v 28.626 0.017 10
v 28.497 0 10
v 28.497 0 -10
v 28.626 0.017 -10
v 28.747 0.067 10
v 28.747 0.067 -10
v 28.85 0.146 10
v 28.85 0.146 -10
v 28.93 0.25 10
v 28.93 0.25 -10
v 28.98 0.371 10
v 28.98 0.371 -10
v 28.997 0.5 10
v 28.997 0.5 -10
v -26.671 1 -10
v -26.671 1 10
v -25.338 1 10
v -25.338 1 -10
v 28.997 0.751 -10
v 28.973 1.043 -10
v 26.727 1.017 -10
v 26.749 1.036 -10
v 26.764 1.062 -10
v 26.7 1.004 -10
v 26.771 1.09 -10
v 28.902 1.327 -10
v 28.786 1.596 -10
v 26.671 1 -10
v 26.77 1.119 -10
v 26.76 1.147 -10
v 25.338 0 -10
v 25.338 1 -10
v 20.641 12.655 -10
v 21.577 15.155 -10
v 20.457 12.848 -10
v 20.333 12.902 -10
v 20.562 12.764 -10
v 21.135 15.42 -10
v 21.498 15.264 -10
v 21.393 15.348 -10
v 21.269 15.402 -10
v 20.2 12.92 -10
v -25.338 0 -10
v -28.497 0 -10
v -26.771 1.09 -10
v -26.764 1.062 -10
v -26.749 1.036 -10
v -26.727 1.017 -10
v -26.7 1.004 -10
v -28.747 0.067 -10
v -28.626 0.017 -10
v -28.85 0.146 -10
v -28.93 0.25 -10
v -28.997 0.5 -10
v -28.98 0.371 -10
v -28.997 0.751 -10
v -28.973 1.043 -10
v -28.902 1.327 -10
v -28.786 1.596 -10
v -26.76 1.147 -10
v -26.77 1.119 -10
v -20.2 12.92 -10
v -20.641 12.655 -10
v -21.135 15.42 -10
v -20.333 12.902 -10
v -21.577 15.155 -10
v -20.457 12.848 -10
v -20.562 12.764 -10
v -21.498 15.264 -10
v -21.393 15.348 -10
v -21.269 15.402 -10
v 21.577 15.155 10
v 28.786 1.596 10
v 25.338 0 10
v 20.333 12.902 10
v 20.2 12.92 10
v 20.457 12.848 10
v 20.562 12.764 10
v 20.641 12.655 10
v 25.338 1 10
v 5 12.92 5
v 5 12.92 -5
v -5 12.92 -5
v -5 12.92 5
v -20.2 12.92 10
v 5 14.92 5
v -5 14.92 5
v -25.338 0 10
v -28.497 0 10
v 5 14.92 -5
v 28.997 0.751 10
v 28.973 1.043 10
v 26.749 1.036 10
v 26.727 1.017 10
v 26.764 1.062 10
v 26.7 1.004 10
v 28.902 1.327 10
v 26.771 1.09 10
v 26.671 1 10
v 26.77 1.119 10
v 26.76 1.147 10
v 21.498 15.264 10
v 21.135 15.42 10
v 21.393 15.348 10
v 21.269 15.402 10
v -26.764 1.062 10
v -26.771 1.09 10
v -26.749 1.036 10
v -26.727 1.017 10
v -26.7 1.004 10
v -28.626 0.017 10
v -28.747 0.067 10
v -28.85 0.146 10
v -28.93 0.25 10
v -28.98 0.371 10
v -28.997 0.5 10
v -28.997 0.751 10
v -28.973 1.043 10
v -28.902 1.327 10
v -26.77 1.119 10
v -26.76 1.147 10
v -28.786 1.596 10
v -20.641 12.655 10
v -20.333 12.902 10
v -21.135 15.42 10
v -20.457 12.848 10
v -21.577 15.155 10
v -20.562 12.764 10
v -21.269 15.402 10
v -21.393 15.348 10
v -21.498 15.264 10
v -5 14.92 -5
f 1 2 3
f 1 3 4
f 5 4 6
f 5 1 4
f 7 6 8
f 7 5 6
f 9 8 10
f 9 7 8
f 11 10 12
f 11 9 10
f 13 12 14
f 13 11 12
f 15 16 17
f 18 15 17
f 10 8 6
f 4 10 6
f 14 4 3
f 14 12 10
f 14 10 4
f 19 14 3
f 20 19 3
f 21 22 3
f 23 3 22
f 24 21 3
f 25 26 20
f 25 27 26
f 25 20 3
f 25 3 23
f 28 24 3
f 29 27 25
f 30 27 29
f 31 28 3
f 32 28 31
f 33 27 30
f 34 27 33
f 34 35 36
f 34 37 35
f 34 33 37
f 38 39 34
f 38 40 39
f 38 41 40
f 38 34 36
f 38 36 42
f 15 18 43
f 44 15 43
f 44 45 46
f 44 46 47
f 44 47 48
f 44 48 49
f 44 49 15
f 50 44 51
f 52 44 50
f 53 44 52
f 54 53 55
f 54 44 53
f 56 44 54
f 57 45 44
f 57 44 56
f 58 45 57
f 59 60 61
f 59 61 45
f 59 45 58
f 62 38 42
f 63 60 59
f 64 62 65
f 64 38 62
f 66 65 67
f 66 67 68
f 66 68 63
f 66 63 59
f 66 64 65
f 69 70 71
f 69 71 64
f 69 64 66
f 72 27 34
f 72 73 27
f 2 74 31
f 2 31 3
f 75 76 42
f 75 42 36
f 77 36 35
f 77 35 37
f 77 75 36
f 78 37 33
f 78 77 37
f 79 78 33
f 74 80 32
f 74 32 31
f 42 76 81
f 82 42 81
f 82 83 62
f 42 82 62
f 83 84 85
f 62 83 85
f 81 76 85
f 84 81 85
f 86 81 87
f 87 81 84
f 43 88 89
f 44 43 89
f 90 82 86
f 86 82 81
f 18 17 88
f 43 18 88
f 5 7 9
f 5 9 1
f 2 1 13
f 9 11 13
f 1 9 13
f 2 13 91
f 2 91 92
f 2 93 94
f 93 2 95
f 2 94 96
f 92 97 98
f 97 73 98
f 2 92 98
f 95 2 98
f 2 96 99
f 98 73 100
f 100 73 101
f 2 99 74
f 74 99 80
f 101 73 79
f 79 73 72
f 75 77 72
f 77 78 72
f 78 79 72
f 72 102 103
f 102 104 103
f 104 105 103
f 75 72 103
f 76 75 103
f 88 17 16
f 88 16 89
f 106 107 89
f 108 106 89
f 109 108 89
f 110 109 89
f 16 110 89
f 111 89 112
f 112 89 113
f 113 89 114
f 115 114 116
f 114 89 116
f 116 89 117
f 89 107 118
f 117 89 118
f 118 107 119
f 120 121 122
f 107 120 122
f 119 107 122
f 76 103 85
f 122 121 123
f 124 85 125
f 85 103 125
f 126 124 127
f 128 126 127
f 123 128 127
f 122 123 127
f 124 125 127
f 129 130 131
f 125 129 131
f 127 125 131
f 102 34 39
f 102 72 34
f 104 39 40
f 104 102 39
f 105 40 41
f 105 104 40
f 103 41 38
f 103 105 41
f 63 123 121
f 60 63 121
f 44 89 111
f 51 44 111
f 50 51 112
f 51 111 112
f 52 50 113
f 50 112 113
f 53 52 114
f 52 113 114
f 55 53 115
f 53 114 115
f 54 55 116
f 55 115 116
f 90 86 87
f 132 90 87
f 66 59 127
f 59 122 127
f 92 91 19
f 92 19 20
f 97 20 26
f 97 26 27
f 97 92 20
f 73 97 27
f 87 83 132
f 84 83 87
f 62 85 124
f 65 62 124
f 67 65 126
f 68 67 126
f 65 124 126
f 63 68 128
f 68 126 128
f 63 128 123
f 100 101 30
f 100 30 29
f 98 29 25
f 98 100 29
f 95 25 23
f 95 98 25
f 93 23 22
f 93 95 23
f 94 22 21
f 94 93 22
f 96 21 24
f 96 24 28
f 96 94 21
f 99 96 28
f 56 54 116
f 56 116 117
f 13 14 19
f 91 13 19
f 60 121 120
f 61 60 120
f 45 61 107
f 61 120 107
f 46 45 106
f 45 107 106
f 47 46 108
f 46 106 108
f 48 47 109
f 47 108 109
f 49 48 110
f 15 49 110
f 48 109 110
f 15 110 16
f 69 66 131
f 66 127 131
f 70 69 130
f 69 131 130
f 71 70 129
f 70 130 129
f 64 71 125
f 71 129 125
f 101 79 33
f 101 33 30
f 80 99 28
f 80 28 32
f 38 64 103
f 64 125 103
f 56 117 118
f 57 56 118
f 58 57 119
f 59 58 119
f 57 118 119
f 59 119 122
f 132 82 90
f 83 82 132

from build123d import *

# Parameters (mm, degrees)
F1_DEPTH = 10
F2_W     = 5
F2_H     = 10
F3_DEPTH = 2


with BuildPart() as f1:
    # F0 (on Top) → F1 (new body, symmetric)
    with BuildSketch(Plane.XY):
        with BuildLine():
            Line((21.1354362127, 15.4197925036), (0, 15.4197925036))
            Line((0, 15.4197925036), (0, 12.9197925036))
            Line((0, 12.9197925036), (20.1995696905, 12.9197925036))
            ThreePointArc((20.1995696905, 12.9197925036), (20.4570887279, 12.8483761539), (20.6410434869, 12.654528285))
            Line((20.6410434869, 12.654528285), (26.7597329087, 1.1469471563))
            ThreePointArc((26.7597329087, 1.1469471563), (26.7571548794, 1.0484961925), (26.6714381494, 1))
            Line((26.6714381494, 1), (25.3378660976, 1))
            Line((25.3378660976, 1), (25.3378660976, 0))
            Line((25.3378660976, 0), (28.4966643127, 0))
            ThreePointArc((28.4966643127, 0), (28.8502177032, 0.1464466094), (28.9966643127, 0.5))
            Line((28.9966643127, 0.5), (28.9966643127, 0.7512095949))
            ThreePointArc((28.9966643127, 0.7512095949), (28.94319662, 1.186669007), (28.7859699798, 1.5962584079))
            Line((28.7859699798, 1.5962584079), (21.5769100091, 15.154528285))
            ThreePointArc((21.5769100091, 15.154528285), (21.3929552502, 15.3483761539), (21.1354362127, 15.4197925036))
        make_face()
    extrude(amount=F1_DEPTH, both=True)

    # F2 (on face) → F3 (cut)
    with BuildSketch(Plane.XZ.offset(-12.9197925036)):
        with Locations((2.5, 0)):
            Rectangle(F2_W, F2_H)
    extrude(amount=-F3_DEPTH, mode=Mode.SUBTRACT)

    # F4: F1 across plane


with BuildPart() as f1_1:
    add(f1.part)
    add(f1.part.mirror(Plane.YZ))


solid = f1_1.part
